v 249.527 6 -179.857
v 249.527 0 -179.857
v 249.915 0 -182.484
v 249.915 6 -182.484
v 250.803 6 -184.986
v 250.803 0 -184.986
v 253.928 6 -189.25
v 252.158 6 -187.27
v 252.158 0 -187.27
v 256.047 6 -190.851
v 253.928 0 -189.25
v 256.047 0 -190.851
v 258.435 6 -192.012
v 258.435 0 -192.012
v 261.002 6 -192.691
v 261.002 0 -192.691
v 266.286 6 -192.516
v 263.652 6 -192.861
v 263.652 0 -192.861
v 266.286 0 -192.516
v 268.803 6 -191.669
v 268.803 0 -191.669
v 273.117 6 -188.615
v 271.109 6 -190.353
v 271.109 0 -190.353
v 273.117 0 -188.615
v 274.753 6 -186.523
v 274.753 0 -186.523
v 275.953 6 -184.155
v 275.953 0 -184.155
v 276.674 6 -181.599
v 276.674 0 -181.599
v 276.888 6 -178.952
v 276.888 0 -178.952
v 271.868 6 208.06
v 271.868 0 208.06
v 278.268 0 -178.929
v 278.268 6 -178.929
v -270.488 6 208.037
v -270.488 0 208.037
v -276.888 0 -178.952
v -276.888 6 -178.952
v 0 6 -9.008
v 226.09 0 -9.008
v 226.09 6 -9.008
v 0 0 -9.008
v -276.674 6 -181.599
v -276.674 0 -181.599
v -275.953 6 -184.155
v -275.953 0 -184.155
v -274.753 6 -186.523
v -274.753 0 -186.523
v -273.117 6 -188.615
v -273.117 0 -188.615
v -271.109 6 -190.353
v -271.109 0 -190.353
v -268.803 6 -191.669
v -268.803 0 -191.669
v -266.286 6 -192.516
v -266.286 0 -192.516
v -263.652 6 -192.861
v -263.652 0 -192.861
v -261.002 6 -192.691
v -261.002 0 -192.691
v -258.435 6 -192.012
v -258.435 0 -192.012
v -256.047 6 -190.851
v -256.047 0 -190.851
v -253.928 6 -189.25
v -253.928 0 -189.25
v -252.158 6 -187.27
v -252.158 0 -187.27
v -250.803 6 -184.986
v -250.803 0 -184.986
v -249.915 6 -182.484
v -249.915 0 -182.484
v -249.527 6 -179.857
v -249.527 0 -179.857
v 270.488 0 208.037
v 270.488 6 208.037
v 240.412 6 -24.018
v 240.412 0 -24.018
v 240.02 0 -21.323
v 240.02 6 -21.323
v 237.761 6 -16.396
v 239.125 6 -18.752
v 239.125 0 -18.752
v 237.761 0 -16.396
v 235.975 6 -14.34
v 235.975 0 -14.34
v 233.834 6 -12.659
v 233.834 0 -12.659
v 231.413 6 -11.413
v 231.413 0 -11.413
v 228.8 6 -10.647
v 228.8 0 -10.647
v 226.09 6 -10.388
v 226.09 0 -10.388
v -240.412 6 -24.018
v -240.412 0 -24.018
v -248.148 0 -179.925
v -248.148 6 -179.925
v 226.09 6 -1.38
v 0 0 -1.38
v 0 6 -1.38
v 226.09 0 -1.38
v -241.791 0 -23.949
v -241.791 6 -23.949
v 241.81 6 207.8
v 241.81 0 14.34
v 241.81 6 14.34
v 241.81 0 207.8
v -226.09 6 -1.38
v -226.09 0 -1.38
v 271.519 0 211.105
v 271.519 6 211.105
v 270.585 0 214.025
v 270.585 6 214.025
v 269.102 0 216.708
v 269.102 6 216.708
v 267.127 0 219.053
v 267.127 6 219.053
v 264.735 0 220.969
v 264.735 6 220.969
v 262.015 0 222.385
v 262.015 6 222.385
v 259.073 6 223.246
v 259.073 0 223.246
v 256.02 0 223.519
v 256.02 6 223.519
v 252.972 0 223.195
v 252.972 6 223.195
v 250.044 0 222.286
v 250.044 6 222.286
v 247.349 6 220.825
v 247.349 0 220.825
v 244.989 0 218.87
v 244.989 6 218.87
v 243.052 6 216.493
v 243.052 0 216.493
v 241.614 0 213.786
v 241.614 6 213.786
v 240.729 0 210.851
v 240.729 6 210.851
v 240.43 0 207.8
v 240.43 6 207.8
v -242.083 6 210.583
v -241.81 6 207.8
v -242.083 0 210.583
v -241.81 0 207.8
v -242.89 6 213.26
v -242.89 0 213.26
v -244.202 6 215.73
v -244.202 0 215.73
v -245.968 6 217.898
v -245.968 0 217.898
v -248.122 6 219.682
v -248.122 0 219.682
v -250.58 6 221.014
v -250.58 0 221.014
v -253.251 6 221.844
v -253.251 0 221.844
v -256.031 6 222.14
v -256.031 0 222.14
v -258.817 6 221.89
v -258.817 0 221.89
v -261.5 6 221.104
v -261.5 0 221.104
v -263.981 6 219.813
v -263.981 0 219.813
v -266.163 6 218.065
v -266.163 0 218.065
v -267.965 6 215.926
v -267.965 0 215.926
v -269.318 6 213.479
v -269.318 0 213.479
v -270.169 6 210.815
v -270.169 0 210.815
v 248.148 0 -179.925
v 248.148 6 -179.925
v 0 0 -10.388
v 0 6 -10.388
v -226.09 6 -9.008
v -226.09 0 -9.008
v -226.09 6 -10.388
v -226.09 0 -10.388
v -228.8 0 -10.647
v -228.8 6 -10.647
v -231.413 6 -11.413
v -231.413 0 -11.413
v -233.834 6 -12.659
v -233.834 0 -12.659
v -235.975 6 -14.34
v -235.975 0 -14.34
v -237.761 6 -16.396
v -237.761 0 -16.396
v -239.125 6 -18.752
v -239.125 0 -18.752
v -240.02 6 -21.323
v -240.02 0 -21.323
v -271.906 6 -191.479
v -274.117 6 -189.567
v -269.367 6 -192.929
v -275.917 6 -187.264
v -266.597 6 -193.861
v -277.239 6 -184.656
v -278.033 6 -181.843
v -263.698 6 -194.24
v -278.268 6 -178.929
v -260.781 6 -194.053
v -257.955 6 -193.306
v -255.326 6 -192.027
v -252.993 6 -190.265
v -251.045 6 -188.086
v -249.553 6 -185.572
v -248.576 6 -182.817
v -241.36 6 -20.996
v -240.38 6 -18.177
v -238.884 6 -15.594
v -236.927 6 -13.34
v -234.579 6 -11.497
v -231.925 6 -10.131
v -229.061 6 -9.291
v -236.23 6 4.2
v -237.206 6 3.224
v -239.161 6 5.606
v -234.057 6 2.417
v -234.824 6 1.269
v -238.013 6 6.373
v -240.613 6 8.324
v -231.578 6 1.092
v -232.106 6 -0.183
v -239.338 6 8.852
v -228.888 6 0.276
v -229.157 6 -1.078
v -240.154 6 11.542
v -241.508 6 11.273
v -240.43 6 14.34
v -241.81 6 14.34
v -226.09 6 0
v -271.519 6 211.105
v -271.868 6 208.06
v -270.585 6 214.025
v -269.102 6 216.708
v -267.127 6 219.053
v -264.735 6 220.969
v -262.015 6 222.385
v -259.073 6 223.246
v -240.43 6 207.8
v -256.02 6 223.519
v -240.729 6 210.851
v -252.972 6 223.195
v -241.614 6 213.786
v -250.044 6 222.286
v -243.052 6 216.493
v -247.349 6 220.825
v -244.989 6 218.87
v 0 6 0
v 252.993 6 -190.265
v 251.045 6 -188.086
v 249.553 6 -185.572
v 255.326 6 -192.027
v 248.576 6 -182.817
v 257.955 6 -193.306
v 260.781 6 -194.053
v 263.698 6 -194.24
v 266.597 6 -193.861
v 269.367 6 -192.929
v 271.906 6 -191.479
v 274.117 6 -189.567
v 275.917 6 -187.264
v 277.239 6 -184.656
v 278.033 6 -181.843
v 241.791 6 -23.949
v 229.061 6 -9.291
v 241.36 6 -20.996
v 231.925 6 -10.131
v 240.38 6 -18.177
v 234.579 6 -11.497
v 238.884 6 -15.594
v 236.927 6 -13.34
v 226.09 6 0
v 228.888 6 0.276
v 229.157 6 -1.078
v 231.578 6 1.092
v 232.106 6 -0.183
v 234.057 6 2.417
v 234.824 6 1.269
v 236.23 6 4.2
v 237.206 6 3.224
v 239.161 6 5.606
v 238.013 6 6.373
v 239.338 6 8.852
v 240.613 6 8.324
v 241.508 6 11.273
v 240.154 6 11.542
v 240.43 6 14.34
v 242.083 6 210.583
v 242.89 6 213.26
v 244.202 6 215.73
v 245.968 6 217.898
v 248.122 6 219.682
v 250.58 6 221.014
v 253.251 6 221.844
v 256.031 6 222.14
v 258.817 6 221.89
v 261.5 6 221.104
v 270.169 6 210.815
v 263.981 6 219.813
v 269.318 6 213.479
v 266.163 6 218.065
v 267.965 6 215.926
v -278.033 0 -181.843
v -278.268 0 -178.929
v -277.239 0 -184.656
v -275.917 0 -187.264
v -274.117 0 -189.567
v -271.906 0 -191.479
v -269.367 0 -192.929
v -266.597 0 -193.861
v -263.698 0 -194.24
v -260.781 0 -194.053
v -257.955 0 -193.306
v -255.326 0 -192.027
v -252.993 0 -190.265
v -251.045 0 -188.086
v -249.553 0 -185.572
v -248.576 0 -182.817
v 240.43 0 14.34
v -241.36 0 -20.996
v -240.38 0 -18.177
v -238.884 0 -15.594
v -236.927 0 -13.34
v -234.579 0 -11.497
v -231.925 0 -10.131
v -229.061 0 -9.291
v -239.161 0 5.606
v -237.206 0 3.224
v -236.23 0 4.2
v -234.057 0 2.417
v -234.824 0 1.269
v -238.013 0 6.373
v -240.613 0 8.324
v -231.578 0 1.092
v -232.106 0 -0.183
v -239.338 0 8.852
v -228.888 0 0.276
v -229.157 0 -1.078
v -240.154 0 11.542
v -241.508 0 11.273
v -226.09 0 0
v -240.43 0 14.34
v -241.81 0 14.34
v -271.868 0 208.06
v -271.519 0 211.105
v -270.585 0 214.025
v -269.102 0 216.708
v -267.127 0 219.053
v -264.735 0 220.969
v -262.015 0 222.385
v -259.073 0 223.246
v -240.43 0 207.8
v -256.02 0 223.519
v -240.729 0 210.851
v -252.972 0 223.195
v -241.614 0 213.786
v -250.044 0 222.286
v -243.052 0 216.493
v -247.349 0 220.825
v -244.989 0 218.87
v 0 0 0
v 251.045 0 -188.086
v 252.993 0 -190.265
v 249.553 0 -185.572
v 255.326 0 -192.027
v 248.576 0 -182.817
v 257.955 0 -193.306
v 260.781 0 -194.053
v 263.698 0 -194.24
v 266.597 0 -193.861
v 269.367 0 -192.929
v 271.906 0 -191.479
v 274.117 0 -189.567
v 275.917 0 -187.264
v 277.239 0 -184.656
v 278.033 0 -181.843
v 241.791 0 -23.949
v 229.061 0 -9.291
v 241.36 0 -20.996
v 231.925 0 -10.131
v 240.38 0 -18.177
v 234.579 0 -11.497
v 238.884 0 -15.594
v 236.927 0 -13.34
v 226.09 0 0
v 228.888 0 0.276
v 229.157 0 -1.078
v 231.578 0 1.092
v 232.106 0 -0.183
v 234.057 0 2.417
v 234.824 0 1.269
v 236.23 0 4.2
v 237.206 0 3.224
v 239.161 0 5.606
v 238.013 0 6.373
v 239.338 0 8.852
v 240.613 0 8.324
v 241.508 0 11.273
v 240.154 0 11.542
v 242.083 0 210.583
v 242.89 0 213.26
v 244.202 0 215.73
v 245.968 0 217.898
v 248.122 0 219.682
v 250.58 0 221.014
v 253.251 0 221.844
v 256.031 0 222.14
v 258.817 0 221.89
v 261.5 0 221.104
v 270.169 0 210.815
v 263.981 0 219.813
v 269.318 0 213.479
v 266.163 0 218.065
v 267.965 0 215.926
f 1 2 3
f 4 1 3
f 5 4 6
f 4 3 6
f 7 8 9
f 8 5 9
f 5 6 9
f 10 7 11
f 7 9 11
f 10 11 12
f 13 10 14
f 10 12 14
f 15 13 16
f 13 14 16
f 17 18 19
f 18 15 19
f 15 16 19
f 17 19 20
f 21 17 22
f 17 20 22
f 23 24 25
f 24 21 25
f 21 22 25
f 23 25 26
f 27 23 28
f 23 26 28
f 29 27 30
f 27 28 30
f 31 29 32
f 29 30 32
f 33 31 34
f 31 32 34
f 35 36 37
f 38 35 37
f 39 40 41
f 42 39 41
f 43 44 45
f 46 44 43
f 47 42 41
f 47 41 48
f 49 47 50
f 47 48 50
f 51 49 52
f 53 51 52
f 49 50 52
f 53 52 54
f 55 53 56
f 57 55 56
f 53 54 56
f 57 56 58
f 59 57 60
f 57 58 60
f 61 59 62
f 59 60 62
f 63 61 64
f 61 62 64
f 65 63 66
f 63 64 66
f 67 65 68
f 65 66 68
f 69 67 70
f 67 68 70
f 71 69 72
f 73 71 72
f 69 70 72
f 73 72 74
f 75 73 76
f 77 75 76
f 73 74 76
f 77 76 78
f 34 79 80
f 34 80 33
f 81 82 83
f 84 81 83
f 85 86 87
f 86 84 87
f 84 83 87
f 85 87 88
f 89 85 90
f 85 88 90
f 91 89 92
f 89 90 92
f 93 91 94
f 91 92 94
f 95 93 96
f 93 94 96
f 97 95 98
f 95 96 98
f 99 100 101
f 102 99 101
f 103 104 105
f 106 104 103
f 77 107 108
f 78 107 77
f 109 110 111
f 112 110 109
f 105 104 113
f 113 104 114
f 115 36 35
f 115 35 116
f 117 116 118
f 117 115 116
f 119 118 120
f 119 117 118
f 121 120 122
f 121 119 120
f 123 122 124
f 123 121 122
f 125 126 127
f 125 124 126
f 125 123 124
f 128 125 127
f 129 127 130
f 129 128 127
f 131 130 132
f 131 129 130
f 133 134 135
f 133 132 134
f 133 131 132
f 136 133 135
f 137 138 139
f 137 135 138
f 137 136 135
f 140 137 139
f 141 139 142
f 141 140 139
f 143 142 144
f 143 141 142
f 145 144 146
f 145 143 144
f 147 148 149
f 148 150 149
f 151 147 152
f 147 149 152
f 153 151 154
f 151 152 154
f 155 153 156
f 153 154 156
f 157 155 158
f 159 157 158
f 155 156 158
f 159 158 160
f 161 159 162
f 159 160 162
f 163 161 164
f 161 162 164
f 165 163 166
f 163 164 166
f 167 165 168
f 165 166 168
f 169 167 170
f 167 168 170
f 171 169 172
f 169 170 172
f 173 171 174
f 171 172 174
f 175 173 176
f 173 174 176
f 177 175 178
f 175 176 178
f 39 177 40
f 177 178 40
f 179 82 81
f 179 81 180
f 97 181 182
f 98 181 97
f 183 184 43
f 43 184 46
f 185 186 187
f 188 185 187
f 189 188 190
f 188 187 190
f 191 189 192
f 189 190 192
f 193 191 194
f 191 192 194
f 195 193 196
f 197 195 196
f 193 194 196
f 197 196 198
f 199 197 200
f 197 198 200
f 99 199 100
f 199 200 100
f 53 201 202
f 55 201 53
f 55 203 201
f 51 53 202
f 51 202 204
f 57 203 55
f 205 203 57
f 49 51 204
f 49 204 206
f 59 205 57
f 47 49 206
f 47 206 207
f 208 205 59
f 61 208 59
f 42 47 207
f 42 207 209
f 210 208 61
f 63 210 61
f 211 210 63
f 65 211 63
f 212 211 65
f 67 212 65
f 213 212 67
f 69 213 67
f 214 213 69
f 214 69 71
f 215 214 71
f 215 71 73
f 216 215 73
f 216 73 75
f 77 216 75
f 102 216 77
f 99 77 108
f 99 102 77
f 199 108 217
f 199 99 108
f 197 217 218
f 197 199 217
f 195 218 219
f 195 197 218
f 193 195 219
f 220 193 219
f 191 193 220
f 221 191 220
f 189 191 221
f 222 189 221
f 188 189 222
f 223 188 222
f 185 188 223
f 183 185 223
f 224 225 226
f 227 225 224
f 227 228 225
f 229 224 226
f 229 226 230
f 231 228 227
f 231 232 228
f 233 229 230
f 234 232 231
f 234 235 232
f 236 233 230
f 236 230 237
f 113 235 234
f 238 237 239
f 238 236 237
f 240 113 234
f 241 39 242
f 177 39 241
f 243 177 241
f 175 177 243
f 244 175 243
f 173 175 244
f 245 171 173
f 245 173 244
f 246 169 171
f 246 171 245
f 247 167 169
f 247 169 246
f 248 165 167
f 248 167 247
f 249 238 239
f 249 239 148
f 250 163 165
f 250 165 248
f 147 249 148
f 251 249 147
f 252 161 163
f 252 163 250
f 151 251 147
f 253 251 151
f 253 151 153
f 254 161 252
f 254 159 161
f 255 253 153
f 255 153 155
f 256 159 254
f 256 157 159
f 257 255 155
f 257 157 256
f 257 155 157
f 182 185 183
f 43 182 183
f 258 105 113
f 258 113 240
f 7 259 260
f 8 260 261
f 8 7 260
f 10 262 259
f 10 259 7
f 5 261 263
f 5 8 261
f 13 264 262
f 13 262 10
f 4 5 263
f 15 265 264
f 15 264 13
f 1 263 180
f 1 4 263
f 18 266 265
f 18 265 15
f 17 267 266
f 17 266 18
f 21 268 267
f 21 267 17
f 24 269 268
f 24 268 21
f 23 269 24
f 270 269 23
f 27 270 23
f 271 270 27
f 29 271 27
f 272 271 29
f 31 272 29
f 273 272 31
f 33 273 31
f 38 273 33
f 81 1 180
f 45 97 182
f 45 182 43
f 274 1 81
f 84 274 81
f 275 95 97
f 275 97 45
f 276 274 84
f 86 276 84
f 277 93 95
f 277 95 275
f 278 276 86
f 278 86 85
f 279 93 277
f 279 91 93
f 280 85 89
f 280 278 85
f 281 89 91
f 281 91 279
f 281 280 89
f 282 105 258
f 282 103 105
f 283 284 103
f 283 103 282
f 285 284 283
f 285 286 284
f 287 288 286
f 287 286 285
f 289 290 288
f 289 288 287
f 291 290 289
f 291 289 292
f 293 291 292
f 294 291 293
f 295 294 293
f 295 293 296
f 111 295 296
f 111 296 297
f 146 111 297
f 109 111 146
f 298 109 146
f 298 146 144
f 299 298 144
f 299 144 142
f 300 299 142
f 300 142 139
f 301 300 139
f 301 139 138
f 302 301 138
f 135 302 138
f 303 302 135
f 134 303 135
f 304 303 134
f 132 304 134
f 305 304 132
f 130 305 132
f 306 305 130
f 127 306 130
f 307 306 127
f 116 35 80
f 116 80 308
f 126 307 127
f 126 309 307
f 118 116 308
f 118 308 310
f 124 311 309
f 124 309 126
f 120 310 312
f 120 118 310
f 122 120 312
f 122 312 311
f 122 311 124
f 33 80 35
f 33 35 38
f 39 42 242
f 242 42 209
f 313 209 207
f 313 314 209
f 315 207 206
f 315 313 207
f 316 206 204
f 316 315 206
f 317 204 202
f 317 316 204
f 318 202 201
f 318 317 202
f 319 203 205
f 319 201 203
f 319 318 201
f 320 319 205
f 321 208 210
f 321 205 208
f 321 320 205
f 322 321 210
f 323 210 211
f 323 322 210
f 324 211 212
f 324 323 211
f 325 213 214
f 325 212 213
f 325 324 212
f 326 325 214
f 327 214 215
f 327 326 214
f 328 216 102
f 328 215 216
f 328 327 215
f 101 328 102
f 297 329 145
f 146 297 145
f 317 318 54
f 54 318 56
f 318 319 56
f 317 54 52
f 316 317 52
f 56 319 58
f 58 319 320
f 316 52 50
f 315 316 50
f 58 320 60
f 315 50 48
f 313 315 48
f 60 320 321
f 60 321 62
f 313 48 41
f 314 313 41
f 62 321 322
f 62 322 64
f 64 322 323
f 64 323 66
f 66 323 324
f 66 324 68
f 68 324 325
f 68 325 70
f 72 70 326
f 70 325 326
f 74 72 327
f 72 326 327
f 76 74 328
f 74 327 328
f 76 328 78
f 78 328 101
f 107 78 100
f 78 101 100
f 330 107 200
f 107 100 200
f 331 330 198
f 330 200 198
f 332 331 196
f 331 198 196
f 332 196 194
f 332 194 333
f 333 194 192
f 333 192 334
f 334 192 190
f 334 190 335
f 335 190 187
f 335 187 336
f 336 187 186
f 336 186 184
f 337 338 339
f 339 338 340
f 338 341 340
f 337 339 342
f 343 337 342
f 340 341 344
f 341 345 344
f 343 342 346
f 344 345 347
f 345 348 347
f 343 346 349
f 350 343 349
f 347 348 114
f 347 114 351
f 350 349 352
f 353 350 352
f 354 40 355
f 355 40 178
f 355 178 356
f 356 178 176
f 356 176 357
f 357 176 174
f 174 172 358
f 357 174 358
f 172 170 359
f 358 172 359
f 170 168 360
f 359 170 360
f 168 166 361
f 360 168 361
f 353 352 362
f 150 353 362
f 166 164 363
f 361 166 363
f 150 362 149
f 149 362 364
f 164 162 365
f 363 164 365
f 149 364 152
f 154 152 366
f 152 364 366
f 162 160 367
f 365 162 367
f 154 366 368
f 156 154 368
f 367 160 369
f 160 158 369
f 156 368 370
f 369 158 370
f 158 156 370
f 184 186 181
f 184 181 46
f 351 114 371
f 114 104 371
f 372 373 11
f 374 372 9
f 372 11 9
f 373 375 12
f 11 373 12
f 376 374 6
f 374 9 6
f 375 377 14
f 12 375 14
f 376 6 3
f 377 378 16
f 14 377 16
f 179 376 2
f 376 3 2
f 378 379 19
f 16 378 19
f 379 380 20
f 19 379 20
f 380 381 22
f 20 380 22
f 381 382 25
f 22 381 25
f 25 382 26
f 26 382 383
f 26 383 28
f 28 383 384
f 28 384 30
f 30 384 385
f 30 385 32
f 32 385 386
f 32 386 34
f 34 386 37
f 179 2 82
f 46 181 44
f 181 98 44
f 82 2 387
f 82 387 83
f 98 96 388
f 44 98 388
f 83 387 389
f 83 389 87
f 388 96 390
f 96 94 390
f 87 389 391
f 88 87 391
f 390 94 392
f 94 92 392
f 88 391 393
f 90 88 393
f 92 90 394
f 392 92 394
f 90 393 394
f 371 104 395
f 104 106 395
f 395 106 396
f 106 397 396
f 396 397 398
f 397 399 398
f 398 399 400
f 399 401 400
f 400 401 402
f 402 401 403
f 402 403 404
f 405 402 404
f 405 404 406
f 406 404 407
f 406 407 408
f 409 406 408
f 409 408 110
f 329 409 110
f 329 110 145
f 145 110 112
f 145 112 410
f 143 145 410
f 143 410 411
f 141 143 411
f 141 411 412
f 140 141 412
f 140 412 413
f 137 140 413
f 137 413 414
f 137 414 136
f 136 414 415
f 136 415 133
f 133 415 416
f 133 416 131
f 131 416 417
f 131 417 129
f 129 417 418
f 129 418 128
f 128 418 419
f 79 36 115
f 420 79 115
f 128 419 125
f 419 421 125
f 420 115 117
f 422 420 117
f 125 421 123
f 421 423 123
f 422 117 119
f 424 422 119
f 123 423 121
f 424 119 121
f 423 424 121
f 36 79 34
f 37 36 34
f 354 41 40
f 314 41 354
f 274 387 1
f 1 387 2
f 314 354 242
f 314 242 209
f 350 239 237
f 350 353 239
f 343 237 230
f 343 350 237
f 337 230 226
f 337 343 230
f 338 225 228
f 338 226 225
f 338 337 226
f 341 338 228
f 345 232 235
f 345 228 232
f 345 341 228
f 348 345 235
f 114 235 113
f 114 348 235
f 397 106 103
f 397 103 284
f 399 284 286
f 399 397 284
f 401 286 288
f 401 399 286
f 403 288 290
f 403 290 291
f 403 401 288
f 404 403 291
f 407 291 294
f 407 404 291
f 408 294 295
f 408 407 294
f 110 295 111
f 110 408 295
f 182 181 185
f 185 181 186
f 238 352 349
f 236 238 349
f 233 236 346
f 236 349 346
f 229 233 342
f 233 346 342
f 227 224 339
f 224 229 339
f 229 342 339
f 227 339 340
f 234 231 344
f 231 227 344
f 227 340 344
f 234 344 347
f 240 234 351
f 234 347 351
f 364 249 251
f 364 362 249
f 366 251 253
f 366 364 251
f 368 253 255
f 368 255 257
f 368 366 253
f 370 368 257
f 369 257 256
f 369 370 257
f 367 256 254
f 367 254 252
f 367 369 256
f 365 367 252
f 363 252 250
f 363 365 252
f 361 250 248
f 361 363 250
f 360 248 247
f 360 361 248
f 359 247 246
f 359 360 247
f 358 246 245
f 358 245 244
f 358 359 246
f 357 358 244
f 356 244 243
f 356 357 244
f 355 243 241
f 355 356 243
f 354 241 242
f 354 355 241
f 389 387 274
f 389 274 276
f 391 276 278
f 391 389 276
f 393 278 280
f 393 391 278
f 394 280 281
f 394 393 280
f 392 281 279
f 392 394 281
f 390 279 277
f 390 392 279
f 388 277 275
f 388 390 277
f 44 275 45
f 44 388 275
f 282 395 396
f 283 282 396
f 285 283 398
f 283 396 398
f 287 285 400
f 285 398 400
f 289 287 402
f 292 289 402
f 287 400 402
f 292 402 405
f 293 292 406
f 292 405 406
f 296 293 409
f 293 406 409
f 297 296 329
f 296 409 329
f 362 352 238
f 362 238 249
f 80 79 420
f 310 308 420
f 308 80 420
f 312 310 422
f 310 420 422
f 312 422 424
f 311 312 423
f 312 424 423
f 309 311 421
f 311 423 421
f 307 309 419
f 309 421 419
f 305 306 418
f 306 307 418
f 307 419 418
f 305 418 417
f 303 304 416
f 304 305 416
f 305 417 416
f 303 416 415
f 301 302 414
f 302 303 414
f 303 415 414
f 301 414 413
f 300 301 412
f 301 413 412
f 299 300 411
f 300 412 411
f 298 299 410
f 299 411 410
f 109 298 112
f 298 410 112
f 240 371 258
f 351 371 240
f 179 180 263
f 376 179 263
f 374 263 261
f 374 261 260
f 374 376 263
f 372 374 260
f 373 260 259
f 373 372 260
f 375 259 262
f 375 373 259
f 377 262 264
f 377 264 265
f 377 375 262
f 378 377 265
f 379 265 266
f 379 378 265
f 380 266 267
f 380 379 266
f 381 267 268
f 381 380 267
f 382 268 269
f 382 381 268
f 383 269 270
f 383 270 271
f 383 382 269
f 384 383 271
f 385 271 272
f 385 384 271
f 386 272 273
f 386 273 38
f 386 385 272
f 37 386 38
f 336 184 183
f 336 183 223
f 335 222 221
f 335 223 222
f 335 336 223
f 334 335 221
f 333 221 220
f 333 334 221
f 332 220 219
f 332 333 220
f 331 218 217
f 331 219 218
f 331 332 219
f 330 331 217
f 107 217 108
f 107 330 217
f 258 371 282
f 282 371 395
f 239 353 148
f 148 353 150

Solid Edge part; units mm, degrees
sketch "Sketch1" plane through (0, 0, 0) normal (0, -1, 0) x (1, 0, 0)
  line L0 (241.81, 14.34) -> (241.81, 207.8)
  arc A0 (241.81, 207.8) -> (270.488, 208.0371) centre (256.15, 207.8) cw
  line L1 (270.488, 208.0371) -> (276.8881, -178.9518)
  arc A1 (276.8881, -178.9518) -> (249.5268, -179.8566) centre (263.2, -179.1781) cw
  line L2 (241.7907, -23.9491) -> (249.5268, -179.8566)
  arc A2 (241.7907, -23.9491) -> (226.09, -9.0081) centre (226.09, -24.7281) ccw
  line L3 (226.09, -9.0081) -> (0, -9.0081)
  line L4 (-226.09, -9.0081) -> (0, -9.0081)
  arc A3 (-241.7907, -23.9491) -> (-226.09, -9.0081) centre (-226.09, -24.7281) cw
  line L5 (-241.7907, -23.9491) -> (-249.5268, -179.8566)
  arc A4 (-276.8881, -178.9518) -> (-249.5268, -179.8566) centre (-263.2, -179.1781) ccw
  line L6 (-270.488, 208.0371) -> (-276.8881, -178.9518)
  arc A5 (-241.81, 207.8) -> (-270.488, 208.0371) centre (-256.15, 207.8) ccw
  line L7 (-241.81, 14.34) -> (-241.81, 207.8)
  arc A6 (-226.09, -1.38) -> (-241.81, 14.34) centre (-226.09, 14.34) cw
  line L8 (0, -1.38) -> (-226.09, -1.38)
  line L9 (0, -1.38) -> (226.09, -1.38)
  arc A7 (226.09, -1.38) -> (241.81, 14.34) centre (226.09, 14.34) ccw
  line L10 (240.43, 14.34) -> (240.43, 207.8)
  arc A8 (240.43, 207.8) -> (271.868, 208.0599) centre (256.1501, 207.8) cw
  line L11 (271.868, 208.0599) -> (278.2681, -178.9289)
  arc A9 (248.1483, -179.925) -> (278.2681, -178.9289) centre (263.2, -179.1781) ccw
  line L12 (240.4124, -24.0175) -> (248.1483, -179.925)
  arc A10 (226.09, -10.3881) -> (240.4124, -24.0175) centre (226.09, -24.7281) cw
  line L13 (0, -10.3881) -> (226.09, -10.3881)
  line L14 (0, -10.3881) -> (-226.09, -10.3881)
  arc A11 (-226.09, -10.3881) -> (-240.4124, -24.0175) centre (-226.09, -24.7281) ccw
  line L15 (-240.4124, -24.0175) -> (-248.1483, -179.925)
  arc A12 (-248.1483, -179.925) -> (-278.2681, -178.9289) centre (-263.2, -179.1781) cw
  line L16 (-271.868, 208.0599) -> (-278.2681, -178.9289)
  arc A13 (-240.43, 207.8) -> (-271.868, 208.0599) centre (-256.1501, 207.8) ccw
  line L17 (-240.43, 14.34) -> (-240.43, 207.8)
  arc A14 (-226.09, 0) -> (-240.43, 14.34) centre (-226.09, 14.34) cw
  line L18 (0, 0) -> (-226.09, 0)
  line L19 (0, 0) -> (226.09, 0)
  arc A15 (226.09, 0) -> (240.43, 14.34) centre (226.09, 14.34) ccw
  dimension "D1" = 494.7246
  dimension "D2" = 1.38
  dimension "D3" = 1.38
  dimension "D4" = 226.09
  dimension "D5" = 28.68
  dimension "D6" = 1.38
  dimension "D7" = 28.68
  dimension "D8" = 27.38
  dimension "D9" = 1.38
  dimension "D10" = 28.68
  dimension "D11" = 28.68
  dimension "D12" = 226.09
  dimension "D13" = 37.11
  dimension "D14" = 193.46
  dimension "D15" = 154.45
extrude "Protrusion1" add sketch "Sketch1" against normal blind 6
